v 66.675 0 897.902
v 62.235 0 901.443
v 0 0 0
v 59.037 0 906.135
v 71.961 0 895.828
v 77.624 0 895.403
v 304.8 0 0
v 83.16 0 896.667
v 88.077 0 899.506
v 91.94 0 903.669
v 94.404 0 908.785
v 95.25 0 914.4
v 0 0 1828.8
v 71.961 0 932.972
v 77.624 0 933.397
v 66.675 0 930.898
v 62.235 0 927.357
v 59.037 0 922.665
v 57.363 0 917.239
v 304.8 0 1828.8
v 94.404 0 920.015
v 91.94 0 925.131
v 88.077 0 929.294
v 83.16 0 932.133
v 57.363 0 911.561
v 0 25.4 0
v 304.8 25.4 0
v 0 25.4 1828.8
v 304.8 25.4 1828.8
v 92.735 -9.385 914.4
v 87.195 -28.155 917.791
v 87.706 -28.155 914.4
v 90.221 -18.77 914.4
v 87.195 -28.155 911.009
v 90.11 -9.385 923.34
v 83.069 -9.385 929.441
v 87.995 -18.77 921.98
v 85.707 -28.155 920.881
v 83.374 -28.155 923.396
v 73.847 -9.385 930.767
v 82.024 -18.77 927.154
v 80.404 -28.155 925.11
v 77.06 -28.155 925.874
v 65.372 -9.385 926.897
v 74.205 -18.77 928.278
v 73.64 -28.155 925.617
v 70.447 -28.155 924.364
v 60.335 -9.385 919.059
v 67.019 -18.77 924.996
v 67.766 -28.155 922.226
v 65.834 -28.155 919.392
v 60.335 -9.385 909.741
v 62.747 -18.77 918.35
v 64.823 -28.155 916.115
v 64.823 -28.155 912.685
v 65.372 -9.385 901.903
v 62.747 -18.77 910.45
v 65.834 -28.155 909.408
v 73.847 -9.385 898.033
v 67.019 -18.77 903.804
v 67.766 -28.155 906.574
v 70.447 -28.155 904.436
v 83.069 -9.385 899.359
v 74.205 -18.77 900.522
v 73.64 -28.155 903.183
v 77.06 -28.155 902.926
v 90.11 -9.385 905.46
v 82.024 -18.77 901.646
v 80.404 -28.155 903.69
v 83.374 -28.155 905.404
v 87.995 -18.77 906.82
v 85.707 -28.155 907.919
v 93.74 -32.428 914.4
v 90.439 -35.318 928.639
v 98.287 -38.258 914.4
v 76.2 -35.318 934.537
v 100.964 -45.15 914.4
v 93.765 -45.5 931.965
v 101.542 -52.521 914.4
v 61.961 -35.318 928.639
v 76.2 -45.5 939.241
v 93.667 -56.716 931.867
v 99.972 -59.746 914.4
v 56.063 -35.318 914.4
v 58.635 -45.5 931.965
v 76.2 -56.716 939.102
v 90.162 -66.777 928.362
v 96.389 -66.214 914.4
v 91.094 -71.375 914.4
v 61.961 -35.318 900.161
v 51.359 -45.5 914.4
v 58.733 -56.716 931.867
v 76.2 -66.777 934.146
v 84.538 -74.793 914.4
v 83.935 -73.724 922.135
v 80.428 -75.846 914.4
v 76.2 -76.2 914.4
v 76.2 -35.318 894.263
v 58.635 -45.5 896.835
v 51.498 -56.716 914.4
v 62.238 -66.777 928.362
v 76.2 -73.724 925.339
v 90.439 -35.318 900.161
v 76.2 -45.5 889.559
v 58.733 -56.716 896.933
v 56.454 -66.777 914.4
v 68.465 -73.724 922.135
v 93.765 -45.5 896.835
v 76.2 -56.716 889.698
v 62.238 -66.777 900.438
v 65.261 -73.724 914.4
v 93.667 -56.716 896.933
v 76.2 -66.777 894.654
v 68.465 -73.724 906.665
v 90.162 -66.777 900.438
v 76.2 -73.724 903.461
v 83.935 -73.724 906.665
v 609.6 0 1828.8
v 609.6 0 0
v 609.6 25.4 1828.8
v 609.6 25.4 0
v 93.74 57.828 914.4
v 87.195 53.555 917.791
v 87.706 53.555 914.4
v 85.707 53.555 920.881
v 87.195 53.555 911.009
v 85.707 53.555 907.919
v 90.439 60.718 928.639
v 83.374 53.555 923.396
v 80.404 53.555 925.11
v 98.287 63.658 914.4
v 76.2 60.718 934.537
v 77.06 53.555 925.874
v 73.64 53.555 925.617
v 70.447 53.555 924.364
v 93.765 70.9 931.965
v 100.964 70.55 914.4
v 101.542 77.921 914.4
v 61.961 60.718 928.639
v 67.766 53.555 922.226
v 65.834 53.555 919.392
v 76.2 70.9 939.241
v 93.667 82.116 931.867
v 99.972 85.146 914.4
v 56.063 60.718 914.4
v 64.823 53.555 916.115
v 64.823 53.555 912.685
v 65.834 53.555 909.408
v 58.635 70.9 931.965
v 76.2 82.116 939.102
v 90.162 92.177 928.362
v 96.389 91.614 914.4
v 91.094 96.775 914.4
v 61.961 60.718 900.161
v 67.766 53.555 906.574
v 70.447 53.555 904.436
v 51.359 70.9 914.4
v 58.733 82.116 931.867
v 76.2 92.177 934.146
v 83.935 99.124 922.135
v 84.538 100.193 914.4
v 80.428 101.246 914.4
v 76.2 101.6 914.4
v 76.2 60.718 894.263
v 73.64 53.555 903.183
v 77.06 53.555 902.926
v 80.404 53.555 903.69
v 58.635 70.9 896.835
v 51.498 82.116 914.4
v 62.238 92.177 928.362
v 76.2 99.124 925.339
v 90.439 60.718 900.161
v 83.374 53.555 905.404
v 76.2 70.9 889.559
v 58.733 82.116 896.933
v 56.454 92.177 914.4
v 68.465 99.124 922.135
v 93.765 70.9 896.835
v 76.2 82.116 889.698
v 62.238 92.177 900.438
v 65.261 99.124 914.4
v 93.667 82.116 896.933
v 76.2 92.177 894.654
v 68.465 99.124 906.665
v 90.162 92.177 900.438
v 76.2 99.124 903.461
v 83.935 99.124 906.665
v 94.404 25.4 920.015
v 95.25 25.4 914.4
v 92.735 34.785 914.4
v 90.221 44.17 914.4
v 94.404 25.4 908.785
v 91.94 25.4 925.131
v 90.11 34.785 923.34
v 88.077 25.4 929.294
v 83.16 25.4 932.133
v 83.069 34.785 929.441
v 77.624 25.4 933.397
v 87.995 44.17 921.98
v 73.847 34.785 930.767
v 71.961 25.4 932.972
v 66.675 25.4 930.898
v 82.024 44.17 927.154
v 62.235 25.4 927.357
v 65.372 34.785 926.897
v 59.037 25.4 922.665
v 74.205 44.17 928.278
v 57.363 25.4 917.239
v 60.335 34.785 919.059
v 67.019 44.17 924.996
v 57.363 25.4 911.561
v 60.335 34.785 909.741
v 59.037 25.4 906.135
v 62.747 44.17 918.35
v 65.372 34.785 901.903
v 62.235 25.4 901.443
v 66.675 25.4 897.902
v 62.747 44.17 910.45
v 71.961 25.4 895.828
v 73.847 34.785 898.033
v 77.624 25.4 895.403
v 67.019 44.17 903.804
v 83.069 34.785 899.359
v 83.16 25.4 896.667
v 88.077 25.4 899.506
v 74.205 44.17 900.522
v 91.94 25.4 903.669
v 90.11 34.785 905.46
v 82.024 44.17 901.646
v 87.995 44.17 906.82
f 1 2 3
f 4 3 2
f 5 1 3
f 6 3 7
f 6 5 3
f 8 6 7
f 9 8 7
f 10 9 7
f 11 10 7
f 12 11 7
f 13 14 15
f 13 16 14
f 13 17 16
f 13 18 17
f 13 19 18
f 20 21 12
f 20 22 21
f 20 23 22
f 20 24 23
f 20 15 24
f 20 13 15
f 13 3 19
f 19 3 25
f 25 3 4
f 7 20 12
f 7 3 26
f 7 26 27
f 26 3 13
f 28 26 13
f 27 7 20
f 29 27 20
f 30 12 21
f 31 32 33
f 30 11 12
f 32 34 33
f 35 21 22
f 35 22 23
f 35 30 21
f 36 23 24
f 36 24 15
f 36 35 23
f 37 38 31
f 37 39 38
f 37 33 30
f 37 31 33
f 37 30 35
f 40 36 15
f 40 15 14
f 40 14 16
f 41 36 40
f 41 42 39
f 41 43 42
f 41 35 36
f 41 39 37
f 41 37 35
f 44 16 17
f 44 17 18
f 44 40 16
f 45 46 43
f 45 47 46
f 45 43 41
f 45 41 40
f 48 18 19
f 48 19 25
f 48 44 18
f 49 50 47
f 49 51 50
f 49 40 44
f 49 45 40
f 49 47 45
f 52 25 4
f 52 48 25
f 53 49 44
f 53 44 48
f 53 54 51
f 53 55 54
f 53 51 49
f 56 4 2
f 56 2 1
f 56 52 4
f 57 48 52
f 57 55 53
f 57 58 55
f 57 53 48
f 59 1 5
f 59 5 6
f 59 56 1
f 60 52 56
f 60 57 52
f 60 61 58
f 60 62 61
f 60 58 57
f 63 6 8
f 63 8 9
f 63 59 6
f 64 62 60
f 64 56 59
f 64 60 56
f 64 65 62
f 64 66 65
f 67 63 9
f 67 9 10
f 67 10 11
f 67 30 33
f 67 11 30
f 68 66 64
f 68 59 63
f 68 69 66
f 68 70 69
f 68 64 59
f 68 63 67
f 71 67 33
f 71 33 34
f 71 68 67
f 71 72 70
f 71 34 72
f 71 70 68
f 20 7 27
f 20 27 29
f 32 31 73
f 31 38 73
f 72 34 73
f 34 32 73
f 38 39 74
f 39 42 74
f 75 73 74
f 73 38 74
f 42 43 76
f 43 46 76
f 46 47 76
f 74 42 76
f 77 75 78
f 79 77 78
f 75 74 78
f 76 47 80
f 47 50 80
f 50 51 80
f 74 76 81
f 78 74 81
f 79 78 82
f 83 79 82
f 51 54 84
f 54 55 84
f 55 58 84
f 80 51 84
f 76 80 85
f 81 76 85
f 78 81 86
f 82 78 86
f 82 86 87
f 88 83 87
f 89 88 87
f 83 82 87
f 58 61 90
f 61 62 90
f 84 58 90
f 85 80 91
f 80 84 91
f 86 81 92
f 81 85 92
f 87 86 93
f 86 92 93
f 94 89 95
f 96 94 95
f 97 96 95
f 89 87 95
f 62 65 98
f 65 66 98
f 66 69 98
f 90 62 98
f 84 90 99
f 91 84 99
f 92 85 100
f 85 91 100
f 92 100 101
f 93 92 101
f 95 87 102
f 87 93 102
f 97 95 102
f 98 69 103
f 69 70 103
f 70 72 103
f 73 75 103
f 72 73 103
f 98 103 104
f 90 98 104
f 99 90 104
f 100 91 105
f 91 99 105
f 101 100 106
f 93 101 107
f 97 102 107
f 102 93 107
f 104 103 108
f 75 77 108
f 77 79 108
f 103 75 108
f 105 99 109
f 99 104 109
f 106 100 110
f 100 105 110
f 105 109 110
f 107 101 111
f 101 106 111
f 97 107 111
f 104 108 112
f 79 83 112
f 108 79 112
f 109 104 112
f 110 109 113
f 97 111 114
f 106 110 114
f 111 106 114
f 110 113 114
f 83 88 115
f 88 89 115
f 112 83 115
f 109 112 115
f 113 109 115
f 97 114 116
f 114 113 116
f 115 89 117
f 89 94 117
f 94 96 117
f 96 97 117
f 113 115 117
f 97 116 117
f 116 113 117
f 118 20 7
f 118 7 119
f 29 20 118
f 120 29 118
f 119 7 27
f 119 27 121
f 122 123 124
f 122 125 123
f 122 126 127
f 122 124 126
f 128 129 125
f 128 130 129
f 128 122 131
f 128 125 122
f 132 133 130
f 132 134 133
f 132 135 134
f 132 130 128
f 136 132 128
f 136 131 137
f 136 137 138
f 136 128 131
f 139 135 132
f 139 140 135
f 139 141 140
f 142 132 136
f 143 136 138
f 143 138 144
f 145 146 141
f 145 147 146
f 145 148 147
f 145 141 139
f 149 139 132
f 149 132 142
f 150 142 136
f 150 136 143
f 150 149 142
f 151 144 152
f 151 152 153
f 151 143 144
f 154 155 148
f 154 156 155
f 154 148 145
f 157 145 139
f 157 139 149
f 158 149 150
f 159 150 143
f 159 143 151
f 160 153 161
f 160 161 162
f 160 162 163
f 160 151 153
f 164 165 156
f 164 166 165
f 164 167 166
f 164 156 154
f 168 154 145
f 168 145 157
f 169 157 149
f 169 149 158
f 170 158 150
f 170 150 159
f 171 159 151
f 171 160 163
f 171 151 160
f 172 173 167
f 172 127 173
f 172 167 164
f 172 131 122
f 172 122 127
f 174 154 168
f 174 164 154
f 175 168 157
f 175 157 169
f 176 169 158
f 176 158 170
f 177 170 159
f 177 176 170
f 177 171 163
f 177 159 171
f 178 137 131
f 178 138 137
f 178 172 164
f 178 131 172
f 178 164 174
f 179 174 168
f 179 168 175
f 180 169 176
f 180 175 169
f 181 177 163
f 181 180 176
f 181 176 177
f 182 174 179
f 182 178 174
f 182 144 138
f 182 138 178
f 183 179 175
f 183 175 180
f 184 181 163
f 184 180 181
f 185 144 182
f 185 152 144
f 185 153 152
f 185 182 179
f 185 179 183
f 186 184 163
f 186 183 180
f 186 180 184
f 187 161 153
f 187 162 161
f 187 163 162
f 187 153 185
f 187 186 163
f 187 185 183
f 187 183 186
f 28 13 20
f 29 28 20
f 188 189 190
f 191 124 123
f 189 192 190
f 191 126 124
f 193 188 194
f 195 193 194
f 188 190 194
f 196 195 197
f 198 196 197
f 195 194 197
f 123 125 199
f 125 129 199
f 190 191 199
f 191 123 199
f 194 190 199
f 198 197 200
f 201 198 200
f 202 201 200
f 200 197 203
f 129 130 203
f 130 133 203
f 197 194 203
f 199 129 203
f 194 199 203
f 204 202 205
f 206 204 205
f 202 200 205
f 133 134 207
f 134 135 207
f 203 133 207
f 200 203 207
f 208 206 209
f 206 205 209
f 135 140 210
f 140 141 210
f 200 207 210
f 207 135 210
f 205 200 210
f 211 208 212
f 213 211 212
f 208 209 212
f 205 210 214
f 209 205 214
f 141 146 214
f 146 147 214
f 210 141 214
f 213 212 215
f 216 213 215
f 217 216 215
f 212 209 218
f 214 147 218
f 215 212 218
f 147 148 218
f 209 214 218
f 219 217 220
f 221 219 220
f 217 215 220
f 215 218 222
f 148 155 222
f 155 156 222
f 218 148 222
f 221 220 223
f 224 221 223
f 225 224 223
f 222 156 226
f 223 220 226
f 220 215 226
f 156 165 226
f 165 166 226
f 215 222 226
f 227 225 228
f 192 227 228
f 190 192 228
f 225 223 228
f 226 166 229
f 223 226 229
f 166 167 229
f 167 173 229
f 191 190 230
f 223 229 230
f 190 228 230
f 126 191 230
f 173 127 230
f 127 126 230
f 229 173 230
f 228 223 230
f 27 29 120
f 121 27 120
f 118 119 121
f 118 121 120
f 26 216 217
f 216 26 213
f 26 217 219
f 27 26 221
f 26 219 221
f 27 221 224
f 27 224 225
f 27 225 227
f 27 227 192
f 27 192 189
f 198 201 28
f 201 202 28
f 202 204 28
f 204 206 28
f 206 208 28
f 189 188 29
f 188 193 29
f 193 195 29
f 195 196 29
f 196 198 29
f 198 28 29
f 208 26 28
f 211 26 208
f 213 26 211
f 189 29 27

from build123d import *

# Parameters (mm, degrees)
F0_W     = 304.8
F0_H     = 1828.8
F4_DEPTH = 25.4
F8_W     = 304.8
F8_H     = 1828.8
F9_DEPTH = 25.4


with BuildPart() as f4:
    # F0 (on Front) → F4 (new body)
    with BuildSketch(Plane.XZ):
        with Locations((152.4, 914.4)):
            Rectangle(F0_W, F0_H)
    extrude(amount=-F4_DEPTH)



with BuildPart() as f5:
    # F5: sweep along a path in F3
    with BuildLine(Plane.XZ) as f5_path:
        CenterArc((76.2, 914.4), 34.6952344102, 0, 360)
    # F2 (on offset) → F5 (sweep)
    with BuildSketch(Plane.XY.offset(914.4)):
        with BuildLine():
            Line((57.15, 0), (64.6942216848, -28.1554186313))
            ThreePointArc((64.6942216848, -28.1554186313), (51.4984578744, -56.7155571689), (76.2, -76.2))
            Line((76.2, -76.2), (76.2, 0))
            Line((76.2, 0), (57.15, 0))
        make_face()
    sweep(path=f5_path.line)


with BuildPart() as f4_1:
    add(f4.part)

    add(f5.part)  # F7 merges F5
    # F7: F5 across plane
    add(f5.part.mirror(Plane.XZ.offset(-12.7)))


with BuildPart() as f9:
    # F8 (on face) → F9 (new body)
    with BuildSketch(Plane.XZ):
        with Locations((457.2, 914.4)):
            Rectangle(F8_W, F8_H)
    extrude(amount=-F9_DEPTH)


solid = Compound([f4_1.part, f9.part])
